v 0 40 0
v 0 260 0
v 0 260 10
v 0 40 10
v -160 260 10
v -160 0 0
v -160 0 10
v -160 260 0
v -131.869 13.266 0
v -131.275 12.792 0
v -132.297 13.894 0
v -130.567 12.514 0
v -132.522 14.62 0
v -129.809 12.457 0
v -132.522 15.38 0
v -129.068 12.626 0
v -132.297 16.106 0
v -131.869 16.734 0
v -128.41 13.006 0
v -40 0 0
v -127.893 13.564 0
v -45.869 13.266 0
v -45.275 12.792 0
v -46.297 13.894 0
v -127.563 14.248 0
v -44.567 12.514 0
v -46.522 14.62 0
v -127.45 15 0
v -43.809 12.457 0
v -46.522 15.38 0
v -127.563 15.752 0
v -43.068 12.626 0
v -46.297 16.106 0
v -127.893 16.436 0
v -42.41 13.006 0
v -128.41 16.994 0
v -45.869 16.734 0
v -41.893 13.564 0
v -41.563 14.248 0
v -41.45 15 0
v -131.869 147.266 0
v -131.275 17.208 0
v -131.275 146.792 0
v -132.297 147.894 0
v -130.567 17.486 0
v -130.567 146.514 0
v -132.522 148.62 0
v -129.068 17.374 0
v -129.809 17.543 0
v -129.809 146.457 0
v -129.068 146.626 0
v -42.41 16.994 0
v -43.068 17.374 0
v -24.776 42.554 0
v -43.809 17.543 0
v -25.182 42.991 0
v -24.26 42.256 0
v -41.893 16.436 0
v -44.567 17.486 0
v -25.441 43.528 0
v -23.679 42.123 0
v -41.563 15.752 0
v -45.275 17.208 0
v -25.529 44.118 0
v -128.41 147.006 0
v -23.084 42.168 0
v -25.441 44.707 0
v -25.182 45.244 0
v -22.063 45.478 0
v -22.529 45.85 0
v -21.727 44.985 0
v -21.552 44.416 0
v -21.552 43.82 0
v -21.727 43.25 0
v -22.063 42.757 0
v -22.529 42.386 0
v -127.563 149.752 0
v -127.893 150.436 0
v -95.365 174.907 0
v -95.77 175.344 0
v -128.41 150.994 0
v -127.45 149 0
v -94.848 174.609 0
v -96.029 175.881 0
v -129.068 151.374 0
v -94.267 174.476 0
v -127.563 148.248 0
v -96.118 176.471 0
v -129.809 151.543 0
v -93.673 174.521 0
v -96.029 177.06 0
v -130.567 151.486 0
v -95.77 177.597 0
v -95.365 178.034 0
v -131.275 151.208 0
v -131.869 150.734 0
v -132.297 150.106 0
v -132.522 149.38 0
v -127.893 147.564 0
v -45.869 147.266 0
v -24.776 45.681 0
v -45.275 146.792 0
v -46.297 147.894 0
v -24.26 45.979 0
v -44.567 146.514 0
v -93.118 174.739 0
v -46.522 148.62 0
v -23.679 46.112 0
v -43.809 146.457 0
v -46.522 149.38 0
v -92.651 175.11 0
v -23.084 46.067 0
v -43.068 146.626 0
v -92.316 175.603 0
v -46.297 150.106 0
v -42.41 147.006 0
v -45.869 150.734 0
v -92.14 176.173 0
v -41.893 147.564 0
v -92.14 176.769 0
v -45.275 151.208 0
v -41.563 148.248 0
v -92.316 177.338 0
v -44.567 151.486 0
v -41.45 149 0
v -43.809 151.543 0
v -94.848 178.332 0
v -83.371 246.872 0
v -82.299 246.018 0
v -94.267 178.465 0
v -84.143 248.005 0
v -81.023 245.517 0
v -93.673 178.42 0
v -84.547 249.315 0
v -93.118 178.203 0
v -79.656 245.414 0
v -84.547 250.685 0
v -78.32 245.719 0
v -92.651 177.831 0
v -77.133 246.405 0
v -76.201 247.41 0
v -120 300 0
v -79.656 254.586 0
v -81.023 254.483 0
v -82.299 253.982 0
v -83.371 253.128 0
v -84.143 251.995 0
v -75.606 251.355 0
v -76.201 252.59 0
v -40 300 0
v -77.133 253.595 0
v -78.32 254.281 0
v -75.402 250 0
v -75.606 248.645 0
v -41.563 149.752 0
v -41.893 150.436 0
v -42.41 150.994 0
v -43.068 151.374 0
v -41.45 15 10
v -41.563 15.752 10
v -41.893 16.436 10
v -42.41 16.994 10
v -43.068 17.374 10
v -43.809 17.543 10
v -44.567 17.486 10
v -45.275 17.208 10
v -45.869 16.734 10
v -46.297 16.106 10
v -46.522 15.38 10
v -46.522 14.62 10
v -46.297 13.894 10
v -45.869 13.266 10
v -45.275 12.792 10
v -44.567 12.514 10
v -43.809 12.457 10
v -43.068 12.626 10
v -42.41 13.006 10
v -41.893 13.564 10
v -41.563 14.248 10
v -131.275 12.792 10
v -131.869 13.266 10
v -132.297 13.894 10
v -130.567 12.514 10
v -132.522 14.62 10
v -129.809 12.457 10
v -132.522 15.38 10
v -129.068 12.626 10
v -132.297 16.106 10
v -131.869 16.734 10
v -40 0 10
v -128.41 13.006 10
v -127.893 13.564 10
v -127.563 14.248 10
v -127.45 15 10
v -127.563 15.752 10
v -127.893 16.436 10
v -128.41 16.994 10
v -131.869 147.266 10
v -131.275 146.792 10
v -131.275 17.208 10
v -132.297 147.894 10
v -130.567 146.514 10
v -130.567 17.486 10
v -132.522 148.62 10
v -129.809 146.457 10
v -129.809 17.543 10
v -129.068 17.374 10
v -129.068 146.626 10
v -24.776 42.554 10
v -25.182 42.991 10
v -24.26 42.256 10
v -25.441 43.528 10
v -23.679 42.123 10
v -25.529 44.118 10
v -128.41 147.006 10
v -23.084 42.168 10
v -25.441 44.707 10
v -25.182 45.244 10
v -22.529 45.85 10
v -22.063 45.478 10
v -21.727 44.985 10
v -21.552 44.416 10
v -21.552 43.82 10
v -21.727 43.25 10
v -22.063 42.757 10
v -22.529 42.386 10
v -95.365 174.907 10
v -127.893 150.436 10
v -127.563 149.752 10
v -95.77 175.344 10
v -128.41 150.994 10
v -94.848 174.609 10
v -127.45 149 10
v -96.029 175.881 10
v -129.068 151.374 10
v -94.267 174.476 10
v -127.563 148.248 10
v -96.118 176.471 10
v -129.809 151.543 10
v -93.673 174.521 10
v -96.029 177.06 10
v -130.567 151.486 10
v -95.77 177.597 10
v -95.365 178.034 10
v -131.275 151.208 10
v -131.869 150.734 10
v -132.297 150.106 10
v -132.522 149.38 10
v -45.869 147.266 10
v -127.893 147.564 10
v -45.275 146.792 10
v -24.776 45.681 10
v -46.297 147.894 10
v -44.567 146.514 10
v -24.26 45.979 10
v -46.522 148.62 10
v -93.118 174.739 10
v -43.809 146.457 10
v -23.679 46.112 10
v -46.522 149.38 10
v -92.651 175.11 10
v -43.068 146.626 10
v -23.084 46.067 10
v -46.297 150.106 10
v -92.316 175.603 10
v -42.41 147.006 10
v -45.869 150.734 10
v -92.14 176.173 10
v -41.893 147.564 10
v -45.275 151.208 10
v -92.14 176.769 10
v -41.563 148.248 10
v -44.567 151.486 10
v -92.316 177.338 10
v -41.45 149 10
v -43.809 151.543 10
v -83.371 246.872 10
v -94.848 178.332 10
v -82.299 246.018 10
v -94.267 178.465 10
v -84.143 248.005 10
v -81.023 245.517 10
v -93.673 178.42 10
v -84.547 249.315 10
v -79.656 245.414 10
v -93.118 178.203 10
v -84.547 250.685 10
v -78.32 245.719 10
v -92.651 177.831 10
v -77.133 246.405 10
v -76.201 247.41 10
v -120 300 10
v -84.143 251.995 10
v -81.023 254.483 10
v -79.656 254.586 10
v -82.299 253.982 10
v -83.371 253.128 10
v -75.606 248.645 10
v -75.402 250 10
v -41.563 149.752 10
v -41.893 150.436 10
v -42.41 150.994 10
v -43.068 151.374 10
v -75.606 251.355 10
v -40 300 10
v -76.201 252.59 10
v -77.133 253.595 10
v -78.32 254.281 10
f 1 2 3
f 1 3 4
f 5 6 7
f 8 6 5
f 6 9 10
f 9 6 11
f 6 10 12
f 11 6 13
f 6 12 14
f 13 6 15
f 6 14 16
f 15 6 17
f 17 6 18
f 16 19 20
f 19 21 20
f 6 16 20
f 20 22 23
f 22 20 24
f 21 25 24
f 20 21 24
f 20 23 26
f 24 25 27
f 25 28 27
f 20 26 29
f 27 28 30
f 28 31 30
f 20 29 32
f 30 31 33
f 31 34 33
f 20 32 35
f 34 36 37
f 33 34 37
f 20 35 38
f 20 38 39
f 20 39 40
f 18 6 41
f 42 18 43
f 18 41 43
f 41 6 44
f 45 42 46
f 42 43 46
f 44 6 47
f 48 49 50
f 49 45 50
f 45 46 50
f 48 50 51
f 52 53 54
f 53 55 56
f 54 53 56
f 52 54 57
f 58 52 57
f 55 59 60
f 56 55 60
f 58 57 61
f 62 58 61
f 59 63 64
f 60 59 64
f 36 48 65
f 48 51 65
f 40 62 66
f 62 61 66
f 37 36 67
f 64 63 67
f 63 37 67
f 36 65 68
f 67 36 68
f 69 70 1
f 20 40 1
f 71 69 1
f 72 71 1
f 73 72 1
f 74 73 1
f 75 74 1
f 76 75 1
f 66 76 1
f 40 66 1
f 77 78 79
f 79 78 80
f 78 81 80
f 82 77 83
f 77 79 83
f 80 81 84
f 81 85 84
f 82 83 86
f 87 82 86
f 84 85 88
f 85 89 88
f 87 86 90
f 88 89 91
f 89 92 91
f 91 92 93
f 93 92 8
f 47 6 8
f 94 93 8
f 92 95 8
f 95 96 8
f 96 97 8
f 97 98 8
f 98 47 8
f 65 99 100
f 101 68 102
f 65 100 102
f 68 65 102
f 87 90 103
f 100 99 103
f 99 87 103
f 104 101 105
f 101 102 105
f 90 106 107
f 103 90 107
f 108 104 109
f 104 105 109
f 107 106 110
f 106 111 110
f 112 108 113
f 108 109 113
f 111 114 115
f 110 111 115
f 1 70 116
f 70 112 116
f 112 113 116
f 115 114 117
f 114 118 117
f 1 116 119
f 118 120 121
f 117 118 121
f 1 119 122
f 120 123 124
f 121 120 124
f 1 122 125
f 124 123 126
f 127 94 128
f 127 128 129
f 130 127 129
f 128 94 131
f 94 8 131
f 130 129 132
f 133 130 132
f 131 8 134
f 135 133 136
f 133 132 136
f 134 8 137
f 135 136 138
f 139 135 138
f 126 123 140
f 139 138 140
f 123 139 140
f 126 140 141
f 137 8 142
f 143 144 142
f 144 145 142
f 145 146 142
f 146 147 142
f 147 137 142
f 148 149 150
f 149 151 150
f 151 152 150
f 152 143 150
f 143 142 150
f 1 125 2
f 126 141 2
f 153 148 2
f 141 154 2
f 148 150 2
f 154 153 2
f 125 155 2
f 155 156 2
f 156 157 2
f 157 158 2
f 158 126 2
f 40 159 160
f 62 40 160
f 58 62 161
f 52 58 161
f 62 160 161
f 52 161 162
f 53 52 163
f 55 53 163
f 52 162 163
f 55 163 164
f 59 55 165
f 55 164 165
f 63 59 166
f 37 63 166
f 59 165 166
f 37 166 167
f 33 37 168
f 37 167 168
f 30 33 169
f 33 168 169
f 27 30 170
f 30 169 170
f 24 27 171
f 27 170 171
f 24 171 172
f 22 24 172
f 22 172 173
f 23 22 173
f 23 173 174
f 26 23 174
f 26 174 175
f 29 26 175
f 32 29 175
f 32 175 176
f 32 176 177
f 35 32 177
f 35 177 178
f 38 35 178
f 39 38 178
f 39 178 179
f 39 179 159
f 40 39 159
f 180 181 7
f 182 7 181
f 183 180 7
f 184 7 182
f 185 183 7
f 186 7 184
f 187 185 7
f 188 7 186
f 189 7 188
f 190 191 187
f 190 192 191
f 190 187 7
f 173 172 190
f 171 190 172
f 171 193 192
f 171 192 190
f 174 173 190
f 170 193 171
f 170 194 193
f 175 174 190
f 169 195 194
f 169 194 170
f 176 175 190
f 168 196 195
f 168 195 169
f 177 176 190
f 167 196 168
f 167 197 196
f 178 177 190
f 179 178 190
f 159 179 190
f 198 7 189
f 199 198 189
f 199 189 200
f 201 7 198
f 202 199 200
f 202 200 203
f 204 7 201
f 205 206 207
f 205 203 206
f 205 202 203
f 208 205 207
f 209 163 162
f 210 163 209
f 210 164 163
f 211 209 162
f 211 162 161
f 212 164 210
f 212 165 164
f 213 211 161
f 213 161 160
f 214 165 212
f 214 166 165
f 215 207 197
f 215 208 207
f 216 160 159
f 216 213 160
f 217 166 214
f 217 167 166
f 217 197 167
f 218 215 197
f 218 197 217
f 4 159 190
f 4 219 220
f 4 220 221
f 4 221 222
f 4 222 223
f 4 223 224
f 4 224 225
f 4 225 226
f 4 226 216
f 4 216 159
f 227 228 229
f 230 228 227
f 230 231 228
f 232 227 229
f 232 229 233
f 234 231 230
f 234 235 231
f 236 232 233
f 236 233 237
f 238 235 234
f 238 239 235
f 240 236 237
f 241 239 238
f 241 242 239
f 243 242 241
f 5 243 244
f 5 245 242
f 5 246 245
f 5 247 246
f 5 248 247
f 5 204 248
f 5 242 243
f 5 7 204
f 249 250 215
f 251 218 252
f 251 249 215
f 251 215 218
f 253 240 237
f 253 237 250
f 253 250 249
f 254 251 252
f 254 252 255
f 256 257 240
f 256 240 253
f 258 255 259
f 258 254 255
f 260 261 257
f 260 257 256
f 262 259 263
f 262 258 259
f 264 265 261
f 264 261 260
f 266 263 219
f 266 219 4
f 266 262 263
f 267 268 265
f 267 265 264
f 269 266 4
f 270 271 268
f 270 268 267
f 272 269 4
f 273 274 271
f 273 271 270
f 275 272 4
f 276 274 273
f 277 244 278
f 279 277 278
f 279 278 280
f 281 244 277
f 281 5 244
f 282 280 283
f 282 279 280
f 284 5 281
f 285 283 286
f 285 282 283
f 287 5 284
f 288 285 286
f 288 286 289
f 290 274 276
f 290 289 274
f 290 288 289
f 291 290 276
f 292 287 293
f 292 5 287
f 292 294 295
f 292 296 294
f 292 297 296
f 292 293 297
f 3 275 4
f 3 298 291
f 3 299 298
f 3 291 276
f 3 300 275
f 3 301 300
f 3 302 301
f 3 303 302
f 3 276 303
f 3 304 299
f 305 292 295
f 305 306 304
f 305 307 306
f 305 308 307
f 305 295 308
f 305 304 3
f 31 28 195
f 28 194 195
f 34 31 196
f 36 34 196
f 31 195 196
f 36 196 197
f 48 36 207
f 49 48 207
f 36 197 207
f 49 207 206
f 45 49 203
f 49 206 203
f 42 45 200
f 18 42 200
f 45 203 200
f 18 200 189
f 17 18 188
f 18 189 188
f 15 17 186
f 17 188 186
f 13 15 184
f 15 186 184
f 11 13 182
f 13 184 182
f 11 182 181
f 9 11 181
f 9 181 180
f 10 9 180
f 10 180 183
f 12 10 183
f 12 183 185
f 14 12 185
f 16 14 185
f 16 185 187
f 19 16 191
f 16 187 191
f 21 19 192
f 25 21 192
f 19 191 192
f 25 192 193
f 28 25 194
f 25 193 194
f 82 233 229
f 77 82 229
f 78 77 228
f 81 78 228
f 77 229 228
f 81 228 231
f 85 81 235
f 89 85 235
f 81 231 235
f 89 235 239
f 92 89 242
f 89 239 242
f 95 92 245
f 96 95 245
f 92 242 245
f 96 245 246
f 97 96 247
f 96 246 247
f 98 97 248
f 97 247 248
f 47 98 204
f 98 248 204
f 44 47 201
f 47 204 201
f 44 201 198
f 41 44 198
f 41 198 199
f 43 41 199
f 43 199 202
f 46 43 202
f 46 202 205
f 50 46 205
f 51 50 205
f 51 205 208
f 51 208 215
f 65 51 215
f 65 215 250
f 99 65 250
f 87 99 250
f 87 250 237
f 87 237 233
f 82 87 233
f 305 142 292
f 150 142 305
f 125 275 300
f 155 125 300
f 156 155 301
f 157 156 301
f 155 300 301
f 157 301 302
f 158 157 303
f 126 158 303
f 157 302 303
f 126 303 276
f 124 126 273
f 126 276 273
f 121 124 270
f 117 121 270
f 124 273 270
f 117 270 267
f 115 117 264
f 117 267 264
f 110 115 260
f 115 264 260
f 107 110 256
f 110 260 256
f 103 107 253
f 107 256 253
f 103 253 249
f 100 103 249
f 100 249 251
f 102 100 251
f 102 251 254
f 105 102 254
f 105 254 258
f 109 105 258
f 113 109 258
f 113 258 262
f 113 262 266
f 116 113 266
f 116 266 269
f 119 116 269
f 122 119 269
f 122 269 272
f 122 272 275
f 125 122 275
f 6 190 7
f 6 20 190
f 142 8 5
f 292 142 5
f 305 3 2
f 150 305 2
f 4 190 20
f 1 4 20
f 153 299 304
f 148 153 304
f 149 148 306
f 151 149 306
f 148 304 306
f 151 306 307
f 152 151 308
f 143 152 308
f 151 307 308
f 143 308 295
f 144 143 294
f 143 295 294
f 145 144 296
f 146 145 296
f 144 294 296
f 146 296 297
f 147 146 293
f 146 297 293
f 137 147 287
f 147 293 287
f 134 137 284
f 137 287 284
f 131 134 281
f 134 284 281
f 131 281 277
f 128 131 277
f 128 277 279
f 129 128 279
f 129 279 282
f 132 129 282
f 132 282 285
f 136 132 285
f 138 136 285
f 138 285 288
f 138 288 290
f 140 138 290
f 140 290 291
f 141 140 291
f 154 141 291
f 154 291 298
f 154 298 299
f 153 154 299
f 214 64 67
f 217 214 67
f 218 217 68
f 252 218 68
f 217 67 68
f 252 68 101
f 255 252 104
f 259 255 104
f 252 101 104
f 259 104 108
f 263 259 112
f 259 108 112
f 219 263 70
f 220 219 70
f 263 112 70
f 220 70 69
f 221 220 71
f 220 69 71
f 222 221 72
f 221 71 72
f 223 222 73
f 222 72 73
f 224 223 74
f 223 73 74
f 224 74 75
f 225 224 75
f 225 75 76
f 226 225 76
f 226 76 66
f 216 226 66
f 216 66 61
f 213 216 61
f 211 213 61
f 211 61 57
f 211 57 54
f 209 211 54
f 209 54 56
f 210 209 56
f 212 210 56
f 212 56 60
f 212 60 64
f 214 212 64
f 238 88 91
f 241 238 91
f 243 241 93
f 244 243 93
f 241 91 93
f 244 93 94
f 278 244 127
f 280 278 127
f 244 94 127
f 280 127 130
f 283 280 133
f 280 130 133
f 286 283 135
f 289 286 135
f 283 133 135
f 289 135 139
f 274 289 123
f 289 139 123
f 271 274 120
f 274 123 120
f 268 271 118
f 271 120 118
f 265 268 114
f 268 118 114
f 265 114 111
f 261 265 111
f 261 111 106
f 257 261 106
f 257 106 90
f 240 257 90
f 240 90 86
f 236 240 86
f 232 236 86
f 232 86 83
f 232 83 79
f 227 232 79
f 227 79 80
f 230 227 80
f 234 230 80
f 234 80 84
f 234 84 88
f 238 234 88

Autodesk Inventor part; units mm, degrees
ref_plane "YZ Plane" through (0, 0, 0) normal (1, 0, 0) x (0, 1, 0)
ref_plane "XZ Plane" through (0, 0, 0) normal (0, 1, 0) x (-1, 0, 0)
ref_plane "XY Plane" through (0, 0, 0) normal (0, 0, 1) x (1, 0, 0)
sketch "Sketch1" plane through (0, 0, 0) normal (0, 0, 1) x (1, 0, 0)
  line L0 (0, 0) -> (-160, 0)
  line L1 (-160, 0) -> (-160, 300)
  line L2 (-160, 300) -> (0, 300)
  line L3 (0, 300) -> (0, 0)
  dimension "d0" = 160
  dimension "d1" = 300
extrude "Extrusion1" add sketch "Sketch1" along normal blind 10
sketch "Sketch2" plane through (0, 0, 10) normal (0, 0, 1) x (1, 0, 0)
  circle A0 centre (-130, 15) radius 2.55
  line L0 (-160, 0) -> (0, 0) projected
  line L1 (-160, 300) -> (-160, 0) projected
  circle A1 centre (-44, 15) radius 2.55
  circle A2 centre (-130, 149) radius 2.55
  circle A3 centre (-44, 149) radius 2.55
  circle A4 centre (-80, 250) radius 4.5984
  circle A5 centre (-50, 50) radius 5.0648 construction
  line L2 (0, 300) -> (-160, 300) projected
  line L3 (0, 0) -> (0, 300) projected
  dimension "d4" = 15
  dimension "d5" = 5.1
  dimension "d6" = 30
  dimension "d9" = 86
  dimension "d12" = 134
  dimension "d18" = 50
  dimension "d19" = 50
  dimension "d20" = 50
  dimension "d33" = 80
extrude "Extrusion2" cut sketch "Sketch2" against normal through all contours A0 | A1 | A2 | A3 | A4
chamfer "Chamfer1" distance 40 angle 45 3 edges at (0, 0, 5) (-160, 300, 5) (0, 300, 5)
sketch "Sketch3" plane through (0, 0, 0) normal (0, 0, -1) x (-1, 0, 0)
  line L0 (0, 300) -> (120, 300) projected
  line L1 (160, 260) -> (160, 0) projected
  line L2 (0, 0) -> (160, 300) construction
  circle A0 centre (94.1176, 176.4706) radius 2
  circle A1 centre (23.5294, 44.1176) radius 2
  line L3 (160, 0) -> (40, 0) projected
  line L4 (160, 0) -> (0, 0) construction
  line L5 (0, 260) -> (0, 0) construction
  line L6 (40, 300) -> (160, 300)
  line L7 (160, 300) -> (160, 0)
  dimension "d25" = 4
  dimension "d27" = 4
  dimension "d31" = 150
  dimension "d32" = 50
extrude "Extrusion3" cut sketch "Sketch3" against normal blind 10
properties part number "legno" material "Wood (Birch)"
